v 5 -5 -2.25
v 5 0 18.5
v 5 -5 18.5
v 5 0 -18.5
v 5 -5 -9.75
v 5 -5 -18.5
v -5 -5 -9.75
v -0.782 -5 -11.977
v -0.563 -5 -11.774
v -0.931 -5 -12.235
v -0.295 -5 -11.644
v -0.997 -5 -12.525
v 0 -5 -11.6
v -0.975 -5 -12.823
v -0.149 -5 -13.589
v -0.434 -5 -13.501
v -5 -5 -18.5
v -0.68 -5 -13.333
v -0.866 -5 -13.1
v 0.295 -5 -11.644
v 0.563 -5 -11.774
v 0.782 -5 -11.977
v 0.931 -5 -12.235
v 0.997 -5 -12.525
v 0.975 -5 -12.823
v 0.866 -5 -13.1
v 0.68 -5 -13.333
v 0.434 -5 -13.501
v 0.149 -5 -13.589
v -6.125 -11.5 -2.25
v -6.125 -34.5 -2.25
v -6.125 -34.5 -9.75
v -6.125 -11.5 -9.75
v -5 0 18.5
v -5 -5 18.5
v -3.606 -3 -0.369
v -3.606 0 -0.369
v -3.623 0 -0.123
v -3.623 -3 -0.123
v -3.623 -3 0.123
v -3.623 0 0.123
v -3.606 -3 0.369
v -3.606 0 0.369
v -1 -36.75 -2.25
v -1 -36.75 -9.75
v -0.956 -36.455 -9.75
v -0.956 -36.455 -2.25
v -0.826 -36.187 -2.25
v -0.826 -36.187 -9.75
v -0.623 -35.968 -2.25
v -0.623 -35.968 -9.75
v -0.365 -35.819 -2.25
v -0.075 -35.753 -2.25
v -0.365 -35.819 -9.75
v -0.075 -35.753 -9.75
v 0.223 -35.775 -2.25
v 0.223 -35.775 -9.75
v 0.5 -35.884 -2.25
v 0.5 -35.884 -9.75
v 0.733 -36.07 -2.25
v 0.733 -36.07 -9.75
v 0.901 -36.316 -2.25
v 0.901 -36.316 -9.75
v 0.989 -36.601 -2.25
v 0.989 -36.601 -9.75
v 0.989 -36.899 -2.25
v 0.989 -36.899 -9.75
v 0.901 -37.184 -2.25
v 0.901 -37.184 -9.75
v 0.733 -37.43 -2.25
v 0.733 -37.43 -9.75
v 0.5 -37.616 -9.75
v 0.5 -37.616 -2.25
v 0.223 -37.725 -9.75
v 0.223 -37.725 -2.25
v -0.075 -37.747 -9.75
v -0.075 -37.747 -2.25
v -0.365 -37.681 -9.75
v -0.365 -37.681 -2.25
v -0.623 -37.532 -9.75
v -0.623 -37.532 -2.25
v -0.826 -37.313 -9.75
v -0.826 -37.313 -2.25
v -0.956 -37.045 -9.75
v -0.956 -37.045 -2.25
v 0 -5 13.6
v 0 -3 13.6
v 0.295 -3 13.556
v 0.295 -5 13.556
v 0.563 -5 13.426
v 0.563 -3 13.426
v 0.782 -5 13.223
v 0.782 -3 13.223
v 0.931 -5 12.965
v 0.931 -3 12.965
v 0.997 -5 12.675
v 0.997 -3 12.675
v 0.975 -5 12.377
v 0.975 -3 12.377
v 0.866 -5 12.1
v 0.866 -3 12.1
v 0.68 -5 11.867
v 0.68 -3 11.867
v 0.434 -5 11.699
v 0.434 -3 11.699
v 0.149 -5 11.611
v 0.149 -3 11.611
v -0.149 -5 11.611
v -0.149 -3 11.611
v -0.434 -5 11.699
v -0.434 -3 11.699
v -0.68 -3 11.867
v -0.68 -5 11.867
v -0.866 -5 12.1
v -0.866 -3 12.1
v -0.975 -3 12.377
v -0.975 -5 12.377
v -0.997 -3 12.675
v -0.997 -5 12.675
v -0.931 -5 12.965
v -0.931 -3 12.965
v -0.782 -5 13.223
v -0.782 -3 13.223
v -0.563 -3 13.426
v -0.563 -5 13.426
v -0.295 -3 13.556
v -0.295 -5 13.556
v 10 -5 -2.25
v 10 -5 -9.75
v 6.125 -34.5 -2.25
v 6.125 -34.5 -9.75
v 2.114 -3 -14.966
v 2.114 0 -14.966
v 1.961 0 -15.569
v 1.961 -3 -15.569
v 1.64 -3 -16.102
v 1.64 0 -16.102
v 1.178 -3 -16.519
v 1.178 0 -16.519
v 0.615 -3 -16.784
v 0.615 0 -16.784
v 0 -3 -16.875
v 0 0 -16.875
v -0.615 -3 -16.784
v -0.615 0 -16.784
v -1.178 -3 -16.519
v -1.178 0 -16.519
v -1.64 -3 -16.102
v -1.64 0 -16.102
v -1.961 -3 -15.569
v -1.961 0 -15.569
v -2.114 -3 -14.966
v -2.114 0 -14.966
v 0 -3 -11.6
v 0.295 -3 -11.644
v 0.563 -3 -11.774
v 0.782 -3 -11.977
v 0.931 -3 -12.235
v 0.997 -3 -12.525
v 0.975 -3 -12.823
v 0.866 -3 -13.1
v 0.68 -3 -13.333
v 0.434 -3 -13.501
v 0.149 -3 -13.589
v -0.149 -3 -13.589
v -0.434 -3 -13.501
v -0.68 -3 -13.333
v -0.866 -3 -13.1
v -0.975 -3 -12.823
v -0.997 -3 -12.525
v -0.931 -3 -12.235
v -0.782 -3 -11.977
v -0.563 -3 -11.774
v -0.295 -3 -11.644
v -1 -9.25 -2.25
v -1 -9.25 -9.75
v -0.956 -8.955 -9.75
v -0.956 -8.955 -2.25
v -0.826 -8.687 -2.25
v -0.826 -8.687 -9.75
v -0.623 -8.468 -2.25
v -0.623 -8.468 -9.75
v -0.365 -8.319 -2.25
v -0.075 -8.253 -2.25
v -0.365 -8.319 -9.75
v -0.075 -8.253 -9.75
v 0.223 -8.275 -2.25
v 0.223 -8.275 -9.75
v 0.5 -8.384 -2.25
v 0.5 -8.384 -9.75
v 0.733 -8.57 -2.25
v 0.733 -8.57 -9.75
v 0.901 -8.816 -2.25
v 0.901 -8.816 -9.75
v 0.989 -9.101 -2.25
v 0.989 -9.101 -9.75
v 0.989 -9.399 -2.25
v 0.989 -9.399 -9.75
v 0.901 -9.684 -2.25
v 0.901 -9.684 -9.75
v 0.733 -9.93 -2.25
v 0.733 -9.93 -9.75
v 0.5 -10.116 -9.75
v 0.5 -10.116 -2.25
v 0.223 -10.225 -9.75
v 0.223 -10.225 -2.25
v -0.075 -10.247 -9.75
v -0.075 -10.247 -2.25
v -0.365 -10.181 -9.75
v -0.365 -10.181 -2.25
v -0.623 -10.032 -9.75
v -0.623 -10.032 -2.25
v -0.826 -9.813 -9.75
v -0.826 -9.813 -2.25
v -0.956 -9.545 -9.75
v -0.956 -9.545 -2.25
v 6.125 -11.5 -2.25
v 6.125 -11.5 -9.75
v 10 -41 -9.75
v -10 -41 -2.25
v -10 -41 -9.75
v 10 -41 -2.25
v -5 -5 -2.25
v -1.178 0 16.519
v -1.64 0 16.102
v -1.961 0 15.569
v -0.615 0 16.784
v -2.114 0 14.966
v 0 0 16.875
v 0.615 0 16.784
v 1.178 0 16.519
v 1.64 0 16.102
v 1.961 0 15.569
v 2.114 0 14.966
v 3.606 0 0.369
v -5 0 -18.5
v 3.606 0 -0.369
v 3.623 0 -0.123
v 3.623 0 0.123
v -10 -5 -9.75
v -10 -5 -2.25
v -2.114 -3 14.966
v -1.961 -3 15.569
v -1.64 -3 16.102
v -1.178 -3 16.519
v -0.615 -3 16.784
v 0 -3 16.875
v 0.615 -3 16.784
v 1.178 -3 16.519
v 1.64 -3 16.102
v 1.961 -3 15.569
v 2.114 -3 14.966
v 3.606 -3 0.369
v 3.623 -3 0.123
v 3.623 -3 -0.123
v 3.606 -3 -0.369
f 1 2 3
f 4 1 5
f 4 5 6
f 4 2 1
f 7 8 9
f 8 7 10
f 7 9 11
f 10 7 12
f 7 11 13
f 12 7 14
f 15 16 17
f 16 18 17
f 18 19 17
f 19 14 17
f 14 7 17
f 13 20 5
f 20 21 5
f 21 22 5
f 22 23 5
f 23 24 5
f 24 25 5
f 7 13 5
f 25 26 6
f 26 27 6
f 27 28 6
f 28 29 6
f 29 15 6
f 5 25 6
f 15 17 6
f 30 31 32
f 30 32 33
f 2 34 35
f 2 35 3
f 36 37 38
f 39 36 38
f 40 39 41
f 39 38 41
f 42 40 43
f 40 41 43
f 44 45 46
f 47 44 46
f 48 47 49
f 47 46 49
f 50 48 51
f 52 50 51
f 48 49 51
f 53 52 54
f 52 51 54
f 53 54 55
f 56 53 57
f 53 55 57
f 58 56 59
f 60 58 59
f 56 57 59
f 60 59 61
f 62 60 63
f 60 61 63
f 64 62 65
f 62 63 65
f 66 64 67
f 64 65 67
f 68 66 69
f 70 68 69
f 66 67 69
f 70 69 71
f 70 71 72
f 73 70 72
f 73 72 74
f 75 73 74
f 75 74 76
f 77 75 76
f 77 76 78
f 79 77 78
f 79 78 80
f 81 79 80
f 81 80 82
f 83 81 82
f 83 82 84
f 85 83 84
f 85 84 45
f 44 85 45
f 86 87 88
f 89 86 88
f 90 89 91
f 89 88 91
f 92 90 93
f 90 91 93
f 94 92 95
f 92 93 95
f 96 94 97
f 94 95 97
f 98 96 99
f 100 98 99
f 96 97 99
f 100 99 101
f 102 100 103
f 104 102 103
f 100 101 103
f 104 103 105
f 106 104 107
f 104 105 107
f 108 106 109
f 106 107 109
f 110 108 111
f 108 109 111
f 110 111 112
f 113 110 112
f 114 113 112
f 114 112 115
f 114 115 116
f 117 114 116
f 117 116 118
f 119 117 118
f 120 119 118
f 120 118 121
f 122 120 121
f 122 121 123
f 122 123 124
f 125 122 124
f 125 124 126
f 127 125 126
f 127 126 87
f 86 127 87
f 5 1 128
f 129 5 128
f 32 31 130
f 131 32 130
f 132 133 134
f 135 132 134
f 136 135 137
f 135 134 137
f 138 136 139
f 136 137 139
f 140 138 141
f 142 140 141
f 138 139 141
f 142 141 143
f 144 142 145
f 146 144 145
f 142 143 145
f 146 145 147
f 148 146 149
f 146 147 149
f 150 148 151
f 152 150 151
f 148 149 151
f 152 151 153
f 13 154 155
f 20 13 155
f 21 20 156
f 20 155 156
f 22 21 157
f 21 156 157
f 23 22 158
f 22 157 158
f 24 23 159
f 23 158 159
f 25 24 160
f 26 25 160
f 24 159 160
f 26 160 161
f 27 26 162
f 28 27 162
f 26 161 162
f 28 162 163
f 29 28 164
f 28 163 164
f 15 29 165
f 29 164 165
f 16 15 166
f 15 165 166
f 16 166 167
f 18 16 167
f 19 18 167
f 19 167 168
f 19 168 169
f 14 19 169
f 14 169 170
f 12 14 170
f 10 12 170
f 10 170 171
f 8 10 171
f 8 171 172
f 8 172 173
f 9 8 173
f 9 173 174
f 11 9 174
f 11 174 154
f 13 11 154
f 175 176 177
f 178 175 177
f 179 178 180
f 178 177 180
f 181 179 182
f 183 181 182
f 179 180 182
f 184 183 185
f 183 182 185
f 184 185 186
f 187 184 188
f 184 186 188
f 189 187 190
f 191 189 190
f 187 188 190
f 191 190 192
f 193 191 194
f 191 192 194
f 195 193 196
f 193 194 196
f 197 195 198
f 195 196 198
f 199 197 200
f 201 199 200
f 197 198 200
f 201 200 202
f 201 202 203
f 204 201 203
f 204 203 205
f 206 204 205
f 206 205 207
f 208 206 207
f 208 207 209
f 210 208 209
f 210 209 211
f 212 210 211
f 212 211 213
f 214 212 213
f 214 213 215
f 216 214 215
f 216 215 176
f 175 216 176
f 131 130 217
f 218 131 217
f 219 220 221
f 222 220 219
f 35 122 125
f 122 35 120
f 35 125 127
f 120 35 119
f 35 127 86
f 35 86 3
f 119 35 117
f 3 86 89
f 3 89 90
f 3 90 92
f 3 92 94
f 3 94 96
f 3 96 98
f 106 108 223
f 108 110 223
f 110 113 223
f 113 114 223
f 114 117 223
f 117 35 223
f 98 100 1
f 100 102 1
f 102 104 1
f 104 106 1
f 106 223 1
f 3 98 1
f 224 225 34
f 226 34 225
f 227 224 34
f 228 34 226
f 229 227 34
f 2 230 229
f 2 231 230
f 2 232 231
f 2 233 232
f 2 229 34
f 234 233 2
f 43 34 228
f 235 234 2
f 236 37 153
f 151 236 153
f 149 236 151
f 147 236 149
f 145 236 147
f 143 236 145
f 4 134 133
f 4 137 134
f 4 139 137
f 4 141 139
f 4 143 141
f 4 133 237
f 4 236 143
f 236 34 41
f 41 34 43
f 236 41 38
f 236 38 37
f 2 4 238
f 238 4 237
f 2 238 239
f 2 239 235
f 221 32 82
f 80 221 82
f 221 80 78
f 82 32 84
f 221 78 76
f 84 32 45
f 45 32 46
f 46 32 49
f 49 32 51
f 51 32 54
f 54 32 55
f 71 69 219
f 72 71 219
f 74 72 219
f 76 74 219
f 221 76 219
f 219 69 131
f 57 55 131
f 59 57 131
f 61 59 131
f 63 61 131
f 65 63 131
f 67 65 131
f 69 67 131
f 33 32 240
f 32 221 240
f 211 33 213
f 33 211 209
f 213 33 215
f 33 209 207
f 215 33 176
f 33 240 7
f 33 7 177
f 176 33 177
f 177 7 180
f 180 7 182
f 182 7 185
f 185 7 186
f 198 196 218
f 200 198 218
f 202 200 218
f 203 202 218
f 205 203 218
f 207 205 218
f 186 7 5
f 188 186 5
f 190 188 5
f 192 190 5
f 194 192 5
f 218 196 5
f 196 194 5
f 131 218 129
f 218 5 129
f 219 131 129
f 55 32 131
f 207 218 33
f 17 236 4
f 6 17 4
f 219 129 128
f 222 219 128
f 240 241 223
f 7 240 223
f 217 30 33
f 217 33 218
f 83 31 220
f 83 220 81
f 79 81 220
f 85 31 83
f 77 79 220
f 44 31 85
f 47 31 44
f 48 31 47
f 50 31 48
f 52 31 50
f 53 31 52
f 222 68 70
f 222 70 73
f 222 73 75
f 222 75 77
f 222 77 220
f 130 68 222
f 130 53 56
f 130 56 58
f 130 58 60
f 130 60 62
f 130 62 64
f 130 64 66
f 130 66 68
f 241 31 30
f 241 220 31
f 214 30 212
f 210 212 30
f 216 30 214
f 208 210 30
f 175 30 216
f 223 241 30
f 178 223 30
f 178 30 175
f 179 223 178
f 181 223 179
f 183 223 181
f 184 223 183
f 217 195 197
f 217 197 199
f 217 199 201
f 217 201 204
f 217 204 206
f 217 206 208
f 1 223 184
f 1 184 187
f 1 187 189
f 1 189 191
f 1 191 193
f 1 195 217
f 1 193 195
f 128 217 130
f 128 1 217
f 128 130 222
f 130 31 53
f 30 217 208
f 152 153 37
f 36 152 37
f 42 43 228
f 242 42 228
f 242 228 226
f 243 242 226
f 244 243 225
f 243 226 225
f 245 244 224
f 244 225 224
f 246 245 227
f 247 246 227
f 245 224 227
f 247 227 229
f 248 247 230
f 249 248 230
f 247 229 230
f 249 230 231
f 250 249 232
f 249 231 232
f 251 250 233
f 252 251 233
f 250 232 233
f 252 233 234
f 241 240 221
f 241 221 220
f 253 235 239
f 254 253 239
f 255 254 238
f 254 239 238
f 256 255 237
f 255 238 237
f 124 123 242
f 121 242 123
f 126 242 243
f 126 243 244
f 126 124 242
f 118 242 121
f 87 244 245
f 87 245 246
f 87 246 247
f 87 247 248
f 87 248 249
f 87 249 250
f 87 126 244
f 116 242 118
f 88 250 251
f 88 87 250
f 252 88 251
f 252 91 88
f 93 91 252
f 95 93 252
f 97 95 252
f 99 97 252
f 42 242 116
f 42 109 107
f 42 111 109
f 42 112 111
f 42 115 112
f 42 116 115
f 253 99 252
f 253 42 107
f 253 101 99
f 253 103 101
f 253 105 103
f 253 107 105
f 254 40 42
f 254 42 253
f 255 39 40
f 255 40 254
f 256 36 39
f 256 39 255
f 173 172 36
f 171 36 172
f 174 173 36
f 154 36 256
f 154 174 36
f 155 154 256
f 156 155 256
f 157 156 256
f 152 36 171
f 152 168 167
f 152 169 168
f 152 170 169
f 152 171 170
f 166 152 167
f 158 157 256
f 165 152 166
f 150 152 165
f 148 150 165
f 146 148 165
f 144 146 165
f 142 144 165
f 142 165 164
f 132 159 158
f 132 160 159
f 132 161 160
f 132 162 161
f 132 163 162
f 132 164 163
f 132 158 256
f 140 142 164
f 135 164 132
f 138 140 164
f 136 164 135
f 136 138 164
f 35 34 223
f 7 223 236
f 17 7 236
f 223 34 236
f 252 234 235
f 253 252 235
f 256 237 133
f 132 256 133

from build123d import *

# Parameters (mm, degrees)
SKETCH_1_W          = 10
SKETCH_1_H          = 37
EXTRUDE_1_DEPTH     = 5
CUT_EXTRUDE_1_DEPTH = 3
SKETCH_3_W          = 20
SKETCH_3_H          = 7.5
EXTRUDE_2_DEPTH     = 36
SKETCH_6_W          = 12.25
SKETCH_6_H          = 23
CUT_EXTRUDE_2_DEPTH = 48.027252737
CUT_EXTRUDE_3_REACH = 45.431
SKETCH_7_R          = 1
CUT_EXTRUDE_4_REACH = 52.784
SKETCH_9_R          = 1


with BuildPart() as part:
    # 草图1 → 凸台-拉伸1 (new body)
    with BuildSketch(Plane(origin=(0, 0, 0), x_dir=(1, 0, 0), z_dir=(0, 1, 0))):
        Rectangle(SKETCH_1_W, SKETCH_1_H)
    extrude(amount=-EXTRUDE_1_DEPTH)

    # 草图2 → 切除-拉伸1 (cut)
    with BuildSketch(Plane(origin=(0, 0, 0), x_dir=(1, 0, 0), z_dir=(0, 1, 0))):
        with BuildLine():
            Line((-2.113983221, 14.966101695), (-3.606206671, 0.368644068))
            ThreePointArc((-3.606206671, 0.368644068), (-3.625, 0), (-3.606206671, -0.368644068))
            Line((-3.606206671, -0.368644068), (-2.113983221, -14.966101695))
            ThreePointArc((-2.113983221, -14.966101695), (0, -16.875), (2.113983221, -14.966101695))
            Line((2.113983221, -14.966101695), (3.606206671, -0.368644068))
            ThreePointArc((3.606206671, -0.368644068), (3.625, 0), (3.606206671, 0.368644068))
            Line((3.606206671, 0.368644068), (2.113983221, 14.966101695))
            ThreePointArc((2.113983221, 14.966101695), (0, 16.875), (-2.113983221, 14.966101695))
        make_face()
    extrude(amount=-CUT_EXTRUDE_1_DEPTH, mode=Mode.SUBTRACT)

    # 草图3 → 凸台-拉伸2 (add)
    with BuildSketch(Plane.XZ.offset(5)):
        with Locations((0, -6)):
            Rectangle(SKETCH_3_W, SKETCH_3_H)
    extrude(amount=EXTRUDE_2_DEPTH)

    # 草图6 → 切除-拉伸2 (cut, through all)
    with BuildSketch(Plane.XY.offset(-2.25)):
        with Locations((0, -23)):
            Rectangle(SKETCH_6_W, SKETCH_6_H)
    extrude(amount=-CUT_EXTRUDE_2_DEPTH, mode=Mode.SUBTRACT)

    # 草图7 → 切除-拉伸3 (cut, up to next)
    with BuildSketch(Plane(origin=(0, -3, 0), x_dir=(1, 0, 0), z_dir=(0, 1, 0)), mode=Mode.PRIVATE) as cut_extrude_3_sk1:
        with Locations(Location((0, 12.6, 0), (0, 0, 270))):
            Circle(SKETCH_7_R)
    cut_extrude_3_tool1 = extrude(cut_extrude_3_sk1.sketch, amount=-CUT_EXTRUDE_3_REACH, mode=Mode.PRIVATE) & part.part
    # 草图7 → 切除-拉伸3 (cut, up to next)
    with BuildSketch(Plane(origin=(0, -3, 0), x_dir=(1, 0, 0), z_dir=(0, 1, 0)), mode=Mode.PRIVATE) as cut_extrude_3_sk2:
        with Locations(Location((0, -12.6, 0), (0, 0, 270))):
            Circle(SKETCH_7_R)
    cut_extrude_3_tool2 = extrude(cut_extrude_3_sk2.sketch, amount=-CUT_EXTRUDE_3_REACH, mode=Mode.PRIVATE) & part.part
    add(cut_extrude_3_tool1.solids().sort_by_distance((0, -3, -12.6))[0], mode=Mode.SUBTRACT)
    add(cut_extrude_3_tool2.solids().sort_by_distance((0, -3, 12.6))[0], mode=Mode.SUBTRACT)

    # 草图9 → 切除-拉伸4 (cut, up to next)
    with BuildSketch(Plane(origin=(0, 0, -9.75), x_dir=(-1, 0, 0), z_dir=(0, 0, -1)), mode=Mode.PRIVATE) as cut_extrude_4_sk1:
        with Locations((0, -9.25)):
            Circle(SKETCH_9_R)
    cut_extrude_4_tool1 = extrude(cut_extrude_4_sk1.sketch, amount=-CUT_EXTRUDE_4_REACH, mode=Mode.PRIVATE) & part.part
    # 草图9 → 切除-拉伸4 (cut, up to next)
    with BuildSketch(Plane(origin=(0, 0, -9.75), x_dir=(-1, 0, 0), z_dir=(0, 0, -1)), mode=Mode.PRIVATE) as cut_extrude_4_sk2:
        with Locations((0, -36.75)):
            Circle(SKETCH_9_R)
    cut_extrude_4_tool2 = extrude(cut_extrude_4_sk2.sketch, amount=-CUT_EXTRUDE_4_REACH, mode=Mode.PRIVATE) & part.part
    add(cut_extrude_4_tool1.solids().sort_by_distance((0, -9.25, -9.75))[0], mode=Mode.SUBTRACT)
    add(cut_extrude_4_tool2.solids().sort_by_distance((0, -36.75, -9.75))[0], mode=Mode.SUBTRACT)


solid = part.part
